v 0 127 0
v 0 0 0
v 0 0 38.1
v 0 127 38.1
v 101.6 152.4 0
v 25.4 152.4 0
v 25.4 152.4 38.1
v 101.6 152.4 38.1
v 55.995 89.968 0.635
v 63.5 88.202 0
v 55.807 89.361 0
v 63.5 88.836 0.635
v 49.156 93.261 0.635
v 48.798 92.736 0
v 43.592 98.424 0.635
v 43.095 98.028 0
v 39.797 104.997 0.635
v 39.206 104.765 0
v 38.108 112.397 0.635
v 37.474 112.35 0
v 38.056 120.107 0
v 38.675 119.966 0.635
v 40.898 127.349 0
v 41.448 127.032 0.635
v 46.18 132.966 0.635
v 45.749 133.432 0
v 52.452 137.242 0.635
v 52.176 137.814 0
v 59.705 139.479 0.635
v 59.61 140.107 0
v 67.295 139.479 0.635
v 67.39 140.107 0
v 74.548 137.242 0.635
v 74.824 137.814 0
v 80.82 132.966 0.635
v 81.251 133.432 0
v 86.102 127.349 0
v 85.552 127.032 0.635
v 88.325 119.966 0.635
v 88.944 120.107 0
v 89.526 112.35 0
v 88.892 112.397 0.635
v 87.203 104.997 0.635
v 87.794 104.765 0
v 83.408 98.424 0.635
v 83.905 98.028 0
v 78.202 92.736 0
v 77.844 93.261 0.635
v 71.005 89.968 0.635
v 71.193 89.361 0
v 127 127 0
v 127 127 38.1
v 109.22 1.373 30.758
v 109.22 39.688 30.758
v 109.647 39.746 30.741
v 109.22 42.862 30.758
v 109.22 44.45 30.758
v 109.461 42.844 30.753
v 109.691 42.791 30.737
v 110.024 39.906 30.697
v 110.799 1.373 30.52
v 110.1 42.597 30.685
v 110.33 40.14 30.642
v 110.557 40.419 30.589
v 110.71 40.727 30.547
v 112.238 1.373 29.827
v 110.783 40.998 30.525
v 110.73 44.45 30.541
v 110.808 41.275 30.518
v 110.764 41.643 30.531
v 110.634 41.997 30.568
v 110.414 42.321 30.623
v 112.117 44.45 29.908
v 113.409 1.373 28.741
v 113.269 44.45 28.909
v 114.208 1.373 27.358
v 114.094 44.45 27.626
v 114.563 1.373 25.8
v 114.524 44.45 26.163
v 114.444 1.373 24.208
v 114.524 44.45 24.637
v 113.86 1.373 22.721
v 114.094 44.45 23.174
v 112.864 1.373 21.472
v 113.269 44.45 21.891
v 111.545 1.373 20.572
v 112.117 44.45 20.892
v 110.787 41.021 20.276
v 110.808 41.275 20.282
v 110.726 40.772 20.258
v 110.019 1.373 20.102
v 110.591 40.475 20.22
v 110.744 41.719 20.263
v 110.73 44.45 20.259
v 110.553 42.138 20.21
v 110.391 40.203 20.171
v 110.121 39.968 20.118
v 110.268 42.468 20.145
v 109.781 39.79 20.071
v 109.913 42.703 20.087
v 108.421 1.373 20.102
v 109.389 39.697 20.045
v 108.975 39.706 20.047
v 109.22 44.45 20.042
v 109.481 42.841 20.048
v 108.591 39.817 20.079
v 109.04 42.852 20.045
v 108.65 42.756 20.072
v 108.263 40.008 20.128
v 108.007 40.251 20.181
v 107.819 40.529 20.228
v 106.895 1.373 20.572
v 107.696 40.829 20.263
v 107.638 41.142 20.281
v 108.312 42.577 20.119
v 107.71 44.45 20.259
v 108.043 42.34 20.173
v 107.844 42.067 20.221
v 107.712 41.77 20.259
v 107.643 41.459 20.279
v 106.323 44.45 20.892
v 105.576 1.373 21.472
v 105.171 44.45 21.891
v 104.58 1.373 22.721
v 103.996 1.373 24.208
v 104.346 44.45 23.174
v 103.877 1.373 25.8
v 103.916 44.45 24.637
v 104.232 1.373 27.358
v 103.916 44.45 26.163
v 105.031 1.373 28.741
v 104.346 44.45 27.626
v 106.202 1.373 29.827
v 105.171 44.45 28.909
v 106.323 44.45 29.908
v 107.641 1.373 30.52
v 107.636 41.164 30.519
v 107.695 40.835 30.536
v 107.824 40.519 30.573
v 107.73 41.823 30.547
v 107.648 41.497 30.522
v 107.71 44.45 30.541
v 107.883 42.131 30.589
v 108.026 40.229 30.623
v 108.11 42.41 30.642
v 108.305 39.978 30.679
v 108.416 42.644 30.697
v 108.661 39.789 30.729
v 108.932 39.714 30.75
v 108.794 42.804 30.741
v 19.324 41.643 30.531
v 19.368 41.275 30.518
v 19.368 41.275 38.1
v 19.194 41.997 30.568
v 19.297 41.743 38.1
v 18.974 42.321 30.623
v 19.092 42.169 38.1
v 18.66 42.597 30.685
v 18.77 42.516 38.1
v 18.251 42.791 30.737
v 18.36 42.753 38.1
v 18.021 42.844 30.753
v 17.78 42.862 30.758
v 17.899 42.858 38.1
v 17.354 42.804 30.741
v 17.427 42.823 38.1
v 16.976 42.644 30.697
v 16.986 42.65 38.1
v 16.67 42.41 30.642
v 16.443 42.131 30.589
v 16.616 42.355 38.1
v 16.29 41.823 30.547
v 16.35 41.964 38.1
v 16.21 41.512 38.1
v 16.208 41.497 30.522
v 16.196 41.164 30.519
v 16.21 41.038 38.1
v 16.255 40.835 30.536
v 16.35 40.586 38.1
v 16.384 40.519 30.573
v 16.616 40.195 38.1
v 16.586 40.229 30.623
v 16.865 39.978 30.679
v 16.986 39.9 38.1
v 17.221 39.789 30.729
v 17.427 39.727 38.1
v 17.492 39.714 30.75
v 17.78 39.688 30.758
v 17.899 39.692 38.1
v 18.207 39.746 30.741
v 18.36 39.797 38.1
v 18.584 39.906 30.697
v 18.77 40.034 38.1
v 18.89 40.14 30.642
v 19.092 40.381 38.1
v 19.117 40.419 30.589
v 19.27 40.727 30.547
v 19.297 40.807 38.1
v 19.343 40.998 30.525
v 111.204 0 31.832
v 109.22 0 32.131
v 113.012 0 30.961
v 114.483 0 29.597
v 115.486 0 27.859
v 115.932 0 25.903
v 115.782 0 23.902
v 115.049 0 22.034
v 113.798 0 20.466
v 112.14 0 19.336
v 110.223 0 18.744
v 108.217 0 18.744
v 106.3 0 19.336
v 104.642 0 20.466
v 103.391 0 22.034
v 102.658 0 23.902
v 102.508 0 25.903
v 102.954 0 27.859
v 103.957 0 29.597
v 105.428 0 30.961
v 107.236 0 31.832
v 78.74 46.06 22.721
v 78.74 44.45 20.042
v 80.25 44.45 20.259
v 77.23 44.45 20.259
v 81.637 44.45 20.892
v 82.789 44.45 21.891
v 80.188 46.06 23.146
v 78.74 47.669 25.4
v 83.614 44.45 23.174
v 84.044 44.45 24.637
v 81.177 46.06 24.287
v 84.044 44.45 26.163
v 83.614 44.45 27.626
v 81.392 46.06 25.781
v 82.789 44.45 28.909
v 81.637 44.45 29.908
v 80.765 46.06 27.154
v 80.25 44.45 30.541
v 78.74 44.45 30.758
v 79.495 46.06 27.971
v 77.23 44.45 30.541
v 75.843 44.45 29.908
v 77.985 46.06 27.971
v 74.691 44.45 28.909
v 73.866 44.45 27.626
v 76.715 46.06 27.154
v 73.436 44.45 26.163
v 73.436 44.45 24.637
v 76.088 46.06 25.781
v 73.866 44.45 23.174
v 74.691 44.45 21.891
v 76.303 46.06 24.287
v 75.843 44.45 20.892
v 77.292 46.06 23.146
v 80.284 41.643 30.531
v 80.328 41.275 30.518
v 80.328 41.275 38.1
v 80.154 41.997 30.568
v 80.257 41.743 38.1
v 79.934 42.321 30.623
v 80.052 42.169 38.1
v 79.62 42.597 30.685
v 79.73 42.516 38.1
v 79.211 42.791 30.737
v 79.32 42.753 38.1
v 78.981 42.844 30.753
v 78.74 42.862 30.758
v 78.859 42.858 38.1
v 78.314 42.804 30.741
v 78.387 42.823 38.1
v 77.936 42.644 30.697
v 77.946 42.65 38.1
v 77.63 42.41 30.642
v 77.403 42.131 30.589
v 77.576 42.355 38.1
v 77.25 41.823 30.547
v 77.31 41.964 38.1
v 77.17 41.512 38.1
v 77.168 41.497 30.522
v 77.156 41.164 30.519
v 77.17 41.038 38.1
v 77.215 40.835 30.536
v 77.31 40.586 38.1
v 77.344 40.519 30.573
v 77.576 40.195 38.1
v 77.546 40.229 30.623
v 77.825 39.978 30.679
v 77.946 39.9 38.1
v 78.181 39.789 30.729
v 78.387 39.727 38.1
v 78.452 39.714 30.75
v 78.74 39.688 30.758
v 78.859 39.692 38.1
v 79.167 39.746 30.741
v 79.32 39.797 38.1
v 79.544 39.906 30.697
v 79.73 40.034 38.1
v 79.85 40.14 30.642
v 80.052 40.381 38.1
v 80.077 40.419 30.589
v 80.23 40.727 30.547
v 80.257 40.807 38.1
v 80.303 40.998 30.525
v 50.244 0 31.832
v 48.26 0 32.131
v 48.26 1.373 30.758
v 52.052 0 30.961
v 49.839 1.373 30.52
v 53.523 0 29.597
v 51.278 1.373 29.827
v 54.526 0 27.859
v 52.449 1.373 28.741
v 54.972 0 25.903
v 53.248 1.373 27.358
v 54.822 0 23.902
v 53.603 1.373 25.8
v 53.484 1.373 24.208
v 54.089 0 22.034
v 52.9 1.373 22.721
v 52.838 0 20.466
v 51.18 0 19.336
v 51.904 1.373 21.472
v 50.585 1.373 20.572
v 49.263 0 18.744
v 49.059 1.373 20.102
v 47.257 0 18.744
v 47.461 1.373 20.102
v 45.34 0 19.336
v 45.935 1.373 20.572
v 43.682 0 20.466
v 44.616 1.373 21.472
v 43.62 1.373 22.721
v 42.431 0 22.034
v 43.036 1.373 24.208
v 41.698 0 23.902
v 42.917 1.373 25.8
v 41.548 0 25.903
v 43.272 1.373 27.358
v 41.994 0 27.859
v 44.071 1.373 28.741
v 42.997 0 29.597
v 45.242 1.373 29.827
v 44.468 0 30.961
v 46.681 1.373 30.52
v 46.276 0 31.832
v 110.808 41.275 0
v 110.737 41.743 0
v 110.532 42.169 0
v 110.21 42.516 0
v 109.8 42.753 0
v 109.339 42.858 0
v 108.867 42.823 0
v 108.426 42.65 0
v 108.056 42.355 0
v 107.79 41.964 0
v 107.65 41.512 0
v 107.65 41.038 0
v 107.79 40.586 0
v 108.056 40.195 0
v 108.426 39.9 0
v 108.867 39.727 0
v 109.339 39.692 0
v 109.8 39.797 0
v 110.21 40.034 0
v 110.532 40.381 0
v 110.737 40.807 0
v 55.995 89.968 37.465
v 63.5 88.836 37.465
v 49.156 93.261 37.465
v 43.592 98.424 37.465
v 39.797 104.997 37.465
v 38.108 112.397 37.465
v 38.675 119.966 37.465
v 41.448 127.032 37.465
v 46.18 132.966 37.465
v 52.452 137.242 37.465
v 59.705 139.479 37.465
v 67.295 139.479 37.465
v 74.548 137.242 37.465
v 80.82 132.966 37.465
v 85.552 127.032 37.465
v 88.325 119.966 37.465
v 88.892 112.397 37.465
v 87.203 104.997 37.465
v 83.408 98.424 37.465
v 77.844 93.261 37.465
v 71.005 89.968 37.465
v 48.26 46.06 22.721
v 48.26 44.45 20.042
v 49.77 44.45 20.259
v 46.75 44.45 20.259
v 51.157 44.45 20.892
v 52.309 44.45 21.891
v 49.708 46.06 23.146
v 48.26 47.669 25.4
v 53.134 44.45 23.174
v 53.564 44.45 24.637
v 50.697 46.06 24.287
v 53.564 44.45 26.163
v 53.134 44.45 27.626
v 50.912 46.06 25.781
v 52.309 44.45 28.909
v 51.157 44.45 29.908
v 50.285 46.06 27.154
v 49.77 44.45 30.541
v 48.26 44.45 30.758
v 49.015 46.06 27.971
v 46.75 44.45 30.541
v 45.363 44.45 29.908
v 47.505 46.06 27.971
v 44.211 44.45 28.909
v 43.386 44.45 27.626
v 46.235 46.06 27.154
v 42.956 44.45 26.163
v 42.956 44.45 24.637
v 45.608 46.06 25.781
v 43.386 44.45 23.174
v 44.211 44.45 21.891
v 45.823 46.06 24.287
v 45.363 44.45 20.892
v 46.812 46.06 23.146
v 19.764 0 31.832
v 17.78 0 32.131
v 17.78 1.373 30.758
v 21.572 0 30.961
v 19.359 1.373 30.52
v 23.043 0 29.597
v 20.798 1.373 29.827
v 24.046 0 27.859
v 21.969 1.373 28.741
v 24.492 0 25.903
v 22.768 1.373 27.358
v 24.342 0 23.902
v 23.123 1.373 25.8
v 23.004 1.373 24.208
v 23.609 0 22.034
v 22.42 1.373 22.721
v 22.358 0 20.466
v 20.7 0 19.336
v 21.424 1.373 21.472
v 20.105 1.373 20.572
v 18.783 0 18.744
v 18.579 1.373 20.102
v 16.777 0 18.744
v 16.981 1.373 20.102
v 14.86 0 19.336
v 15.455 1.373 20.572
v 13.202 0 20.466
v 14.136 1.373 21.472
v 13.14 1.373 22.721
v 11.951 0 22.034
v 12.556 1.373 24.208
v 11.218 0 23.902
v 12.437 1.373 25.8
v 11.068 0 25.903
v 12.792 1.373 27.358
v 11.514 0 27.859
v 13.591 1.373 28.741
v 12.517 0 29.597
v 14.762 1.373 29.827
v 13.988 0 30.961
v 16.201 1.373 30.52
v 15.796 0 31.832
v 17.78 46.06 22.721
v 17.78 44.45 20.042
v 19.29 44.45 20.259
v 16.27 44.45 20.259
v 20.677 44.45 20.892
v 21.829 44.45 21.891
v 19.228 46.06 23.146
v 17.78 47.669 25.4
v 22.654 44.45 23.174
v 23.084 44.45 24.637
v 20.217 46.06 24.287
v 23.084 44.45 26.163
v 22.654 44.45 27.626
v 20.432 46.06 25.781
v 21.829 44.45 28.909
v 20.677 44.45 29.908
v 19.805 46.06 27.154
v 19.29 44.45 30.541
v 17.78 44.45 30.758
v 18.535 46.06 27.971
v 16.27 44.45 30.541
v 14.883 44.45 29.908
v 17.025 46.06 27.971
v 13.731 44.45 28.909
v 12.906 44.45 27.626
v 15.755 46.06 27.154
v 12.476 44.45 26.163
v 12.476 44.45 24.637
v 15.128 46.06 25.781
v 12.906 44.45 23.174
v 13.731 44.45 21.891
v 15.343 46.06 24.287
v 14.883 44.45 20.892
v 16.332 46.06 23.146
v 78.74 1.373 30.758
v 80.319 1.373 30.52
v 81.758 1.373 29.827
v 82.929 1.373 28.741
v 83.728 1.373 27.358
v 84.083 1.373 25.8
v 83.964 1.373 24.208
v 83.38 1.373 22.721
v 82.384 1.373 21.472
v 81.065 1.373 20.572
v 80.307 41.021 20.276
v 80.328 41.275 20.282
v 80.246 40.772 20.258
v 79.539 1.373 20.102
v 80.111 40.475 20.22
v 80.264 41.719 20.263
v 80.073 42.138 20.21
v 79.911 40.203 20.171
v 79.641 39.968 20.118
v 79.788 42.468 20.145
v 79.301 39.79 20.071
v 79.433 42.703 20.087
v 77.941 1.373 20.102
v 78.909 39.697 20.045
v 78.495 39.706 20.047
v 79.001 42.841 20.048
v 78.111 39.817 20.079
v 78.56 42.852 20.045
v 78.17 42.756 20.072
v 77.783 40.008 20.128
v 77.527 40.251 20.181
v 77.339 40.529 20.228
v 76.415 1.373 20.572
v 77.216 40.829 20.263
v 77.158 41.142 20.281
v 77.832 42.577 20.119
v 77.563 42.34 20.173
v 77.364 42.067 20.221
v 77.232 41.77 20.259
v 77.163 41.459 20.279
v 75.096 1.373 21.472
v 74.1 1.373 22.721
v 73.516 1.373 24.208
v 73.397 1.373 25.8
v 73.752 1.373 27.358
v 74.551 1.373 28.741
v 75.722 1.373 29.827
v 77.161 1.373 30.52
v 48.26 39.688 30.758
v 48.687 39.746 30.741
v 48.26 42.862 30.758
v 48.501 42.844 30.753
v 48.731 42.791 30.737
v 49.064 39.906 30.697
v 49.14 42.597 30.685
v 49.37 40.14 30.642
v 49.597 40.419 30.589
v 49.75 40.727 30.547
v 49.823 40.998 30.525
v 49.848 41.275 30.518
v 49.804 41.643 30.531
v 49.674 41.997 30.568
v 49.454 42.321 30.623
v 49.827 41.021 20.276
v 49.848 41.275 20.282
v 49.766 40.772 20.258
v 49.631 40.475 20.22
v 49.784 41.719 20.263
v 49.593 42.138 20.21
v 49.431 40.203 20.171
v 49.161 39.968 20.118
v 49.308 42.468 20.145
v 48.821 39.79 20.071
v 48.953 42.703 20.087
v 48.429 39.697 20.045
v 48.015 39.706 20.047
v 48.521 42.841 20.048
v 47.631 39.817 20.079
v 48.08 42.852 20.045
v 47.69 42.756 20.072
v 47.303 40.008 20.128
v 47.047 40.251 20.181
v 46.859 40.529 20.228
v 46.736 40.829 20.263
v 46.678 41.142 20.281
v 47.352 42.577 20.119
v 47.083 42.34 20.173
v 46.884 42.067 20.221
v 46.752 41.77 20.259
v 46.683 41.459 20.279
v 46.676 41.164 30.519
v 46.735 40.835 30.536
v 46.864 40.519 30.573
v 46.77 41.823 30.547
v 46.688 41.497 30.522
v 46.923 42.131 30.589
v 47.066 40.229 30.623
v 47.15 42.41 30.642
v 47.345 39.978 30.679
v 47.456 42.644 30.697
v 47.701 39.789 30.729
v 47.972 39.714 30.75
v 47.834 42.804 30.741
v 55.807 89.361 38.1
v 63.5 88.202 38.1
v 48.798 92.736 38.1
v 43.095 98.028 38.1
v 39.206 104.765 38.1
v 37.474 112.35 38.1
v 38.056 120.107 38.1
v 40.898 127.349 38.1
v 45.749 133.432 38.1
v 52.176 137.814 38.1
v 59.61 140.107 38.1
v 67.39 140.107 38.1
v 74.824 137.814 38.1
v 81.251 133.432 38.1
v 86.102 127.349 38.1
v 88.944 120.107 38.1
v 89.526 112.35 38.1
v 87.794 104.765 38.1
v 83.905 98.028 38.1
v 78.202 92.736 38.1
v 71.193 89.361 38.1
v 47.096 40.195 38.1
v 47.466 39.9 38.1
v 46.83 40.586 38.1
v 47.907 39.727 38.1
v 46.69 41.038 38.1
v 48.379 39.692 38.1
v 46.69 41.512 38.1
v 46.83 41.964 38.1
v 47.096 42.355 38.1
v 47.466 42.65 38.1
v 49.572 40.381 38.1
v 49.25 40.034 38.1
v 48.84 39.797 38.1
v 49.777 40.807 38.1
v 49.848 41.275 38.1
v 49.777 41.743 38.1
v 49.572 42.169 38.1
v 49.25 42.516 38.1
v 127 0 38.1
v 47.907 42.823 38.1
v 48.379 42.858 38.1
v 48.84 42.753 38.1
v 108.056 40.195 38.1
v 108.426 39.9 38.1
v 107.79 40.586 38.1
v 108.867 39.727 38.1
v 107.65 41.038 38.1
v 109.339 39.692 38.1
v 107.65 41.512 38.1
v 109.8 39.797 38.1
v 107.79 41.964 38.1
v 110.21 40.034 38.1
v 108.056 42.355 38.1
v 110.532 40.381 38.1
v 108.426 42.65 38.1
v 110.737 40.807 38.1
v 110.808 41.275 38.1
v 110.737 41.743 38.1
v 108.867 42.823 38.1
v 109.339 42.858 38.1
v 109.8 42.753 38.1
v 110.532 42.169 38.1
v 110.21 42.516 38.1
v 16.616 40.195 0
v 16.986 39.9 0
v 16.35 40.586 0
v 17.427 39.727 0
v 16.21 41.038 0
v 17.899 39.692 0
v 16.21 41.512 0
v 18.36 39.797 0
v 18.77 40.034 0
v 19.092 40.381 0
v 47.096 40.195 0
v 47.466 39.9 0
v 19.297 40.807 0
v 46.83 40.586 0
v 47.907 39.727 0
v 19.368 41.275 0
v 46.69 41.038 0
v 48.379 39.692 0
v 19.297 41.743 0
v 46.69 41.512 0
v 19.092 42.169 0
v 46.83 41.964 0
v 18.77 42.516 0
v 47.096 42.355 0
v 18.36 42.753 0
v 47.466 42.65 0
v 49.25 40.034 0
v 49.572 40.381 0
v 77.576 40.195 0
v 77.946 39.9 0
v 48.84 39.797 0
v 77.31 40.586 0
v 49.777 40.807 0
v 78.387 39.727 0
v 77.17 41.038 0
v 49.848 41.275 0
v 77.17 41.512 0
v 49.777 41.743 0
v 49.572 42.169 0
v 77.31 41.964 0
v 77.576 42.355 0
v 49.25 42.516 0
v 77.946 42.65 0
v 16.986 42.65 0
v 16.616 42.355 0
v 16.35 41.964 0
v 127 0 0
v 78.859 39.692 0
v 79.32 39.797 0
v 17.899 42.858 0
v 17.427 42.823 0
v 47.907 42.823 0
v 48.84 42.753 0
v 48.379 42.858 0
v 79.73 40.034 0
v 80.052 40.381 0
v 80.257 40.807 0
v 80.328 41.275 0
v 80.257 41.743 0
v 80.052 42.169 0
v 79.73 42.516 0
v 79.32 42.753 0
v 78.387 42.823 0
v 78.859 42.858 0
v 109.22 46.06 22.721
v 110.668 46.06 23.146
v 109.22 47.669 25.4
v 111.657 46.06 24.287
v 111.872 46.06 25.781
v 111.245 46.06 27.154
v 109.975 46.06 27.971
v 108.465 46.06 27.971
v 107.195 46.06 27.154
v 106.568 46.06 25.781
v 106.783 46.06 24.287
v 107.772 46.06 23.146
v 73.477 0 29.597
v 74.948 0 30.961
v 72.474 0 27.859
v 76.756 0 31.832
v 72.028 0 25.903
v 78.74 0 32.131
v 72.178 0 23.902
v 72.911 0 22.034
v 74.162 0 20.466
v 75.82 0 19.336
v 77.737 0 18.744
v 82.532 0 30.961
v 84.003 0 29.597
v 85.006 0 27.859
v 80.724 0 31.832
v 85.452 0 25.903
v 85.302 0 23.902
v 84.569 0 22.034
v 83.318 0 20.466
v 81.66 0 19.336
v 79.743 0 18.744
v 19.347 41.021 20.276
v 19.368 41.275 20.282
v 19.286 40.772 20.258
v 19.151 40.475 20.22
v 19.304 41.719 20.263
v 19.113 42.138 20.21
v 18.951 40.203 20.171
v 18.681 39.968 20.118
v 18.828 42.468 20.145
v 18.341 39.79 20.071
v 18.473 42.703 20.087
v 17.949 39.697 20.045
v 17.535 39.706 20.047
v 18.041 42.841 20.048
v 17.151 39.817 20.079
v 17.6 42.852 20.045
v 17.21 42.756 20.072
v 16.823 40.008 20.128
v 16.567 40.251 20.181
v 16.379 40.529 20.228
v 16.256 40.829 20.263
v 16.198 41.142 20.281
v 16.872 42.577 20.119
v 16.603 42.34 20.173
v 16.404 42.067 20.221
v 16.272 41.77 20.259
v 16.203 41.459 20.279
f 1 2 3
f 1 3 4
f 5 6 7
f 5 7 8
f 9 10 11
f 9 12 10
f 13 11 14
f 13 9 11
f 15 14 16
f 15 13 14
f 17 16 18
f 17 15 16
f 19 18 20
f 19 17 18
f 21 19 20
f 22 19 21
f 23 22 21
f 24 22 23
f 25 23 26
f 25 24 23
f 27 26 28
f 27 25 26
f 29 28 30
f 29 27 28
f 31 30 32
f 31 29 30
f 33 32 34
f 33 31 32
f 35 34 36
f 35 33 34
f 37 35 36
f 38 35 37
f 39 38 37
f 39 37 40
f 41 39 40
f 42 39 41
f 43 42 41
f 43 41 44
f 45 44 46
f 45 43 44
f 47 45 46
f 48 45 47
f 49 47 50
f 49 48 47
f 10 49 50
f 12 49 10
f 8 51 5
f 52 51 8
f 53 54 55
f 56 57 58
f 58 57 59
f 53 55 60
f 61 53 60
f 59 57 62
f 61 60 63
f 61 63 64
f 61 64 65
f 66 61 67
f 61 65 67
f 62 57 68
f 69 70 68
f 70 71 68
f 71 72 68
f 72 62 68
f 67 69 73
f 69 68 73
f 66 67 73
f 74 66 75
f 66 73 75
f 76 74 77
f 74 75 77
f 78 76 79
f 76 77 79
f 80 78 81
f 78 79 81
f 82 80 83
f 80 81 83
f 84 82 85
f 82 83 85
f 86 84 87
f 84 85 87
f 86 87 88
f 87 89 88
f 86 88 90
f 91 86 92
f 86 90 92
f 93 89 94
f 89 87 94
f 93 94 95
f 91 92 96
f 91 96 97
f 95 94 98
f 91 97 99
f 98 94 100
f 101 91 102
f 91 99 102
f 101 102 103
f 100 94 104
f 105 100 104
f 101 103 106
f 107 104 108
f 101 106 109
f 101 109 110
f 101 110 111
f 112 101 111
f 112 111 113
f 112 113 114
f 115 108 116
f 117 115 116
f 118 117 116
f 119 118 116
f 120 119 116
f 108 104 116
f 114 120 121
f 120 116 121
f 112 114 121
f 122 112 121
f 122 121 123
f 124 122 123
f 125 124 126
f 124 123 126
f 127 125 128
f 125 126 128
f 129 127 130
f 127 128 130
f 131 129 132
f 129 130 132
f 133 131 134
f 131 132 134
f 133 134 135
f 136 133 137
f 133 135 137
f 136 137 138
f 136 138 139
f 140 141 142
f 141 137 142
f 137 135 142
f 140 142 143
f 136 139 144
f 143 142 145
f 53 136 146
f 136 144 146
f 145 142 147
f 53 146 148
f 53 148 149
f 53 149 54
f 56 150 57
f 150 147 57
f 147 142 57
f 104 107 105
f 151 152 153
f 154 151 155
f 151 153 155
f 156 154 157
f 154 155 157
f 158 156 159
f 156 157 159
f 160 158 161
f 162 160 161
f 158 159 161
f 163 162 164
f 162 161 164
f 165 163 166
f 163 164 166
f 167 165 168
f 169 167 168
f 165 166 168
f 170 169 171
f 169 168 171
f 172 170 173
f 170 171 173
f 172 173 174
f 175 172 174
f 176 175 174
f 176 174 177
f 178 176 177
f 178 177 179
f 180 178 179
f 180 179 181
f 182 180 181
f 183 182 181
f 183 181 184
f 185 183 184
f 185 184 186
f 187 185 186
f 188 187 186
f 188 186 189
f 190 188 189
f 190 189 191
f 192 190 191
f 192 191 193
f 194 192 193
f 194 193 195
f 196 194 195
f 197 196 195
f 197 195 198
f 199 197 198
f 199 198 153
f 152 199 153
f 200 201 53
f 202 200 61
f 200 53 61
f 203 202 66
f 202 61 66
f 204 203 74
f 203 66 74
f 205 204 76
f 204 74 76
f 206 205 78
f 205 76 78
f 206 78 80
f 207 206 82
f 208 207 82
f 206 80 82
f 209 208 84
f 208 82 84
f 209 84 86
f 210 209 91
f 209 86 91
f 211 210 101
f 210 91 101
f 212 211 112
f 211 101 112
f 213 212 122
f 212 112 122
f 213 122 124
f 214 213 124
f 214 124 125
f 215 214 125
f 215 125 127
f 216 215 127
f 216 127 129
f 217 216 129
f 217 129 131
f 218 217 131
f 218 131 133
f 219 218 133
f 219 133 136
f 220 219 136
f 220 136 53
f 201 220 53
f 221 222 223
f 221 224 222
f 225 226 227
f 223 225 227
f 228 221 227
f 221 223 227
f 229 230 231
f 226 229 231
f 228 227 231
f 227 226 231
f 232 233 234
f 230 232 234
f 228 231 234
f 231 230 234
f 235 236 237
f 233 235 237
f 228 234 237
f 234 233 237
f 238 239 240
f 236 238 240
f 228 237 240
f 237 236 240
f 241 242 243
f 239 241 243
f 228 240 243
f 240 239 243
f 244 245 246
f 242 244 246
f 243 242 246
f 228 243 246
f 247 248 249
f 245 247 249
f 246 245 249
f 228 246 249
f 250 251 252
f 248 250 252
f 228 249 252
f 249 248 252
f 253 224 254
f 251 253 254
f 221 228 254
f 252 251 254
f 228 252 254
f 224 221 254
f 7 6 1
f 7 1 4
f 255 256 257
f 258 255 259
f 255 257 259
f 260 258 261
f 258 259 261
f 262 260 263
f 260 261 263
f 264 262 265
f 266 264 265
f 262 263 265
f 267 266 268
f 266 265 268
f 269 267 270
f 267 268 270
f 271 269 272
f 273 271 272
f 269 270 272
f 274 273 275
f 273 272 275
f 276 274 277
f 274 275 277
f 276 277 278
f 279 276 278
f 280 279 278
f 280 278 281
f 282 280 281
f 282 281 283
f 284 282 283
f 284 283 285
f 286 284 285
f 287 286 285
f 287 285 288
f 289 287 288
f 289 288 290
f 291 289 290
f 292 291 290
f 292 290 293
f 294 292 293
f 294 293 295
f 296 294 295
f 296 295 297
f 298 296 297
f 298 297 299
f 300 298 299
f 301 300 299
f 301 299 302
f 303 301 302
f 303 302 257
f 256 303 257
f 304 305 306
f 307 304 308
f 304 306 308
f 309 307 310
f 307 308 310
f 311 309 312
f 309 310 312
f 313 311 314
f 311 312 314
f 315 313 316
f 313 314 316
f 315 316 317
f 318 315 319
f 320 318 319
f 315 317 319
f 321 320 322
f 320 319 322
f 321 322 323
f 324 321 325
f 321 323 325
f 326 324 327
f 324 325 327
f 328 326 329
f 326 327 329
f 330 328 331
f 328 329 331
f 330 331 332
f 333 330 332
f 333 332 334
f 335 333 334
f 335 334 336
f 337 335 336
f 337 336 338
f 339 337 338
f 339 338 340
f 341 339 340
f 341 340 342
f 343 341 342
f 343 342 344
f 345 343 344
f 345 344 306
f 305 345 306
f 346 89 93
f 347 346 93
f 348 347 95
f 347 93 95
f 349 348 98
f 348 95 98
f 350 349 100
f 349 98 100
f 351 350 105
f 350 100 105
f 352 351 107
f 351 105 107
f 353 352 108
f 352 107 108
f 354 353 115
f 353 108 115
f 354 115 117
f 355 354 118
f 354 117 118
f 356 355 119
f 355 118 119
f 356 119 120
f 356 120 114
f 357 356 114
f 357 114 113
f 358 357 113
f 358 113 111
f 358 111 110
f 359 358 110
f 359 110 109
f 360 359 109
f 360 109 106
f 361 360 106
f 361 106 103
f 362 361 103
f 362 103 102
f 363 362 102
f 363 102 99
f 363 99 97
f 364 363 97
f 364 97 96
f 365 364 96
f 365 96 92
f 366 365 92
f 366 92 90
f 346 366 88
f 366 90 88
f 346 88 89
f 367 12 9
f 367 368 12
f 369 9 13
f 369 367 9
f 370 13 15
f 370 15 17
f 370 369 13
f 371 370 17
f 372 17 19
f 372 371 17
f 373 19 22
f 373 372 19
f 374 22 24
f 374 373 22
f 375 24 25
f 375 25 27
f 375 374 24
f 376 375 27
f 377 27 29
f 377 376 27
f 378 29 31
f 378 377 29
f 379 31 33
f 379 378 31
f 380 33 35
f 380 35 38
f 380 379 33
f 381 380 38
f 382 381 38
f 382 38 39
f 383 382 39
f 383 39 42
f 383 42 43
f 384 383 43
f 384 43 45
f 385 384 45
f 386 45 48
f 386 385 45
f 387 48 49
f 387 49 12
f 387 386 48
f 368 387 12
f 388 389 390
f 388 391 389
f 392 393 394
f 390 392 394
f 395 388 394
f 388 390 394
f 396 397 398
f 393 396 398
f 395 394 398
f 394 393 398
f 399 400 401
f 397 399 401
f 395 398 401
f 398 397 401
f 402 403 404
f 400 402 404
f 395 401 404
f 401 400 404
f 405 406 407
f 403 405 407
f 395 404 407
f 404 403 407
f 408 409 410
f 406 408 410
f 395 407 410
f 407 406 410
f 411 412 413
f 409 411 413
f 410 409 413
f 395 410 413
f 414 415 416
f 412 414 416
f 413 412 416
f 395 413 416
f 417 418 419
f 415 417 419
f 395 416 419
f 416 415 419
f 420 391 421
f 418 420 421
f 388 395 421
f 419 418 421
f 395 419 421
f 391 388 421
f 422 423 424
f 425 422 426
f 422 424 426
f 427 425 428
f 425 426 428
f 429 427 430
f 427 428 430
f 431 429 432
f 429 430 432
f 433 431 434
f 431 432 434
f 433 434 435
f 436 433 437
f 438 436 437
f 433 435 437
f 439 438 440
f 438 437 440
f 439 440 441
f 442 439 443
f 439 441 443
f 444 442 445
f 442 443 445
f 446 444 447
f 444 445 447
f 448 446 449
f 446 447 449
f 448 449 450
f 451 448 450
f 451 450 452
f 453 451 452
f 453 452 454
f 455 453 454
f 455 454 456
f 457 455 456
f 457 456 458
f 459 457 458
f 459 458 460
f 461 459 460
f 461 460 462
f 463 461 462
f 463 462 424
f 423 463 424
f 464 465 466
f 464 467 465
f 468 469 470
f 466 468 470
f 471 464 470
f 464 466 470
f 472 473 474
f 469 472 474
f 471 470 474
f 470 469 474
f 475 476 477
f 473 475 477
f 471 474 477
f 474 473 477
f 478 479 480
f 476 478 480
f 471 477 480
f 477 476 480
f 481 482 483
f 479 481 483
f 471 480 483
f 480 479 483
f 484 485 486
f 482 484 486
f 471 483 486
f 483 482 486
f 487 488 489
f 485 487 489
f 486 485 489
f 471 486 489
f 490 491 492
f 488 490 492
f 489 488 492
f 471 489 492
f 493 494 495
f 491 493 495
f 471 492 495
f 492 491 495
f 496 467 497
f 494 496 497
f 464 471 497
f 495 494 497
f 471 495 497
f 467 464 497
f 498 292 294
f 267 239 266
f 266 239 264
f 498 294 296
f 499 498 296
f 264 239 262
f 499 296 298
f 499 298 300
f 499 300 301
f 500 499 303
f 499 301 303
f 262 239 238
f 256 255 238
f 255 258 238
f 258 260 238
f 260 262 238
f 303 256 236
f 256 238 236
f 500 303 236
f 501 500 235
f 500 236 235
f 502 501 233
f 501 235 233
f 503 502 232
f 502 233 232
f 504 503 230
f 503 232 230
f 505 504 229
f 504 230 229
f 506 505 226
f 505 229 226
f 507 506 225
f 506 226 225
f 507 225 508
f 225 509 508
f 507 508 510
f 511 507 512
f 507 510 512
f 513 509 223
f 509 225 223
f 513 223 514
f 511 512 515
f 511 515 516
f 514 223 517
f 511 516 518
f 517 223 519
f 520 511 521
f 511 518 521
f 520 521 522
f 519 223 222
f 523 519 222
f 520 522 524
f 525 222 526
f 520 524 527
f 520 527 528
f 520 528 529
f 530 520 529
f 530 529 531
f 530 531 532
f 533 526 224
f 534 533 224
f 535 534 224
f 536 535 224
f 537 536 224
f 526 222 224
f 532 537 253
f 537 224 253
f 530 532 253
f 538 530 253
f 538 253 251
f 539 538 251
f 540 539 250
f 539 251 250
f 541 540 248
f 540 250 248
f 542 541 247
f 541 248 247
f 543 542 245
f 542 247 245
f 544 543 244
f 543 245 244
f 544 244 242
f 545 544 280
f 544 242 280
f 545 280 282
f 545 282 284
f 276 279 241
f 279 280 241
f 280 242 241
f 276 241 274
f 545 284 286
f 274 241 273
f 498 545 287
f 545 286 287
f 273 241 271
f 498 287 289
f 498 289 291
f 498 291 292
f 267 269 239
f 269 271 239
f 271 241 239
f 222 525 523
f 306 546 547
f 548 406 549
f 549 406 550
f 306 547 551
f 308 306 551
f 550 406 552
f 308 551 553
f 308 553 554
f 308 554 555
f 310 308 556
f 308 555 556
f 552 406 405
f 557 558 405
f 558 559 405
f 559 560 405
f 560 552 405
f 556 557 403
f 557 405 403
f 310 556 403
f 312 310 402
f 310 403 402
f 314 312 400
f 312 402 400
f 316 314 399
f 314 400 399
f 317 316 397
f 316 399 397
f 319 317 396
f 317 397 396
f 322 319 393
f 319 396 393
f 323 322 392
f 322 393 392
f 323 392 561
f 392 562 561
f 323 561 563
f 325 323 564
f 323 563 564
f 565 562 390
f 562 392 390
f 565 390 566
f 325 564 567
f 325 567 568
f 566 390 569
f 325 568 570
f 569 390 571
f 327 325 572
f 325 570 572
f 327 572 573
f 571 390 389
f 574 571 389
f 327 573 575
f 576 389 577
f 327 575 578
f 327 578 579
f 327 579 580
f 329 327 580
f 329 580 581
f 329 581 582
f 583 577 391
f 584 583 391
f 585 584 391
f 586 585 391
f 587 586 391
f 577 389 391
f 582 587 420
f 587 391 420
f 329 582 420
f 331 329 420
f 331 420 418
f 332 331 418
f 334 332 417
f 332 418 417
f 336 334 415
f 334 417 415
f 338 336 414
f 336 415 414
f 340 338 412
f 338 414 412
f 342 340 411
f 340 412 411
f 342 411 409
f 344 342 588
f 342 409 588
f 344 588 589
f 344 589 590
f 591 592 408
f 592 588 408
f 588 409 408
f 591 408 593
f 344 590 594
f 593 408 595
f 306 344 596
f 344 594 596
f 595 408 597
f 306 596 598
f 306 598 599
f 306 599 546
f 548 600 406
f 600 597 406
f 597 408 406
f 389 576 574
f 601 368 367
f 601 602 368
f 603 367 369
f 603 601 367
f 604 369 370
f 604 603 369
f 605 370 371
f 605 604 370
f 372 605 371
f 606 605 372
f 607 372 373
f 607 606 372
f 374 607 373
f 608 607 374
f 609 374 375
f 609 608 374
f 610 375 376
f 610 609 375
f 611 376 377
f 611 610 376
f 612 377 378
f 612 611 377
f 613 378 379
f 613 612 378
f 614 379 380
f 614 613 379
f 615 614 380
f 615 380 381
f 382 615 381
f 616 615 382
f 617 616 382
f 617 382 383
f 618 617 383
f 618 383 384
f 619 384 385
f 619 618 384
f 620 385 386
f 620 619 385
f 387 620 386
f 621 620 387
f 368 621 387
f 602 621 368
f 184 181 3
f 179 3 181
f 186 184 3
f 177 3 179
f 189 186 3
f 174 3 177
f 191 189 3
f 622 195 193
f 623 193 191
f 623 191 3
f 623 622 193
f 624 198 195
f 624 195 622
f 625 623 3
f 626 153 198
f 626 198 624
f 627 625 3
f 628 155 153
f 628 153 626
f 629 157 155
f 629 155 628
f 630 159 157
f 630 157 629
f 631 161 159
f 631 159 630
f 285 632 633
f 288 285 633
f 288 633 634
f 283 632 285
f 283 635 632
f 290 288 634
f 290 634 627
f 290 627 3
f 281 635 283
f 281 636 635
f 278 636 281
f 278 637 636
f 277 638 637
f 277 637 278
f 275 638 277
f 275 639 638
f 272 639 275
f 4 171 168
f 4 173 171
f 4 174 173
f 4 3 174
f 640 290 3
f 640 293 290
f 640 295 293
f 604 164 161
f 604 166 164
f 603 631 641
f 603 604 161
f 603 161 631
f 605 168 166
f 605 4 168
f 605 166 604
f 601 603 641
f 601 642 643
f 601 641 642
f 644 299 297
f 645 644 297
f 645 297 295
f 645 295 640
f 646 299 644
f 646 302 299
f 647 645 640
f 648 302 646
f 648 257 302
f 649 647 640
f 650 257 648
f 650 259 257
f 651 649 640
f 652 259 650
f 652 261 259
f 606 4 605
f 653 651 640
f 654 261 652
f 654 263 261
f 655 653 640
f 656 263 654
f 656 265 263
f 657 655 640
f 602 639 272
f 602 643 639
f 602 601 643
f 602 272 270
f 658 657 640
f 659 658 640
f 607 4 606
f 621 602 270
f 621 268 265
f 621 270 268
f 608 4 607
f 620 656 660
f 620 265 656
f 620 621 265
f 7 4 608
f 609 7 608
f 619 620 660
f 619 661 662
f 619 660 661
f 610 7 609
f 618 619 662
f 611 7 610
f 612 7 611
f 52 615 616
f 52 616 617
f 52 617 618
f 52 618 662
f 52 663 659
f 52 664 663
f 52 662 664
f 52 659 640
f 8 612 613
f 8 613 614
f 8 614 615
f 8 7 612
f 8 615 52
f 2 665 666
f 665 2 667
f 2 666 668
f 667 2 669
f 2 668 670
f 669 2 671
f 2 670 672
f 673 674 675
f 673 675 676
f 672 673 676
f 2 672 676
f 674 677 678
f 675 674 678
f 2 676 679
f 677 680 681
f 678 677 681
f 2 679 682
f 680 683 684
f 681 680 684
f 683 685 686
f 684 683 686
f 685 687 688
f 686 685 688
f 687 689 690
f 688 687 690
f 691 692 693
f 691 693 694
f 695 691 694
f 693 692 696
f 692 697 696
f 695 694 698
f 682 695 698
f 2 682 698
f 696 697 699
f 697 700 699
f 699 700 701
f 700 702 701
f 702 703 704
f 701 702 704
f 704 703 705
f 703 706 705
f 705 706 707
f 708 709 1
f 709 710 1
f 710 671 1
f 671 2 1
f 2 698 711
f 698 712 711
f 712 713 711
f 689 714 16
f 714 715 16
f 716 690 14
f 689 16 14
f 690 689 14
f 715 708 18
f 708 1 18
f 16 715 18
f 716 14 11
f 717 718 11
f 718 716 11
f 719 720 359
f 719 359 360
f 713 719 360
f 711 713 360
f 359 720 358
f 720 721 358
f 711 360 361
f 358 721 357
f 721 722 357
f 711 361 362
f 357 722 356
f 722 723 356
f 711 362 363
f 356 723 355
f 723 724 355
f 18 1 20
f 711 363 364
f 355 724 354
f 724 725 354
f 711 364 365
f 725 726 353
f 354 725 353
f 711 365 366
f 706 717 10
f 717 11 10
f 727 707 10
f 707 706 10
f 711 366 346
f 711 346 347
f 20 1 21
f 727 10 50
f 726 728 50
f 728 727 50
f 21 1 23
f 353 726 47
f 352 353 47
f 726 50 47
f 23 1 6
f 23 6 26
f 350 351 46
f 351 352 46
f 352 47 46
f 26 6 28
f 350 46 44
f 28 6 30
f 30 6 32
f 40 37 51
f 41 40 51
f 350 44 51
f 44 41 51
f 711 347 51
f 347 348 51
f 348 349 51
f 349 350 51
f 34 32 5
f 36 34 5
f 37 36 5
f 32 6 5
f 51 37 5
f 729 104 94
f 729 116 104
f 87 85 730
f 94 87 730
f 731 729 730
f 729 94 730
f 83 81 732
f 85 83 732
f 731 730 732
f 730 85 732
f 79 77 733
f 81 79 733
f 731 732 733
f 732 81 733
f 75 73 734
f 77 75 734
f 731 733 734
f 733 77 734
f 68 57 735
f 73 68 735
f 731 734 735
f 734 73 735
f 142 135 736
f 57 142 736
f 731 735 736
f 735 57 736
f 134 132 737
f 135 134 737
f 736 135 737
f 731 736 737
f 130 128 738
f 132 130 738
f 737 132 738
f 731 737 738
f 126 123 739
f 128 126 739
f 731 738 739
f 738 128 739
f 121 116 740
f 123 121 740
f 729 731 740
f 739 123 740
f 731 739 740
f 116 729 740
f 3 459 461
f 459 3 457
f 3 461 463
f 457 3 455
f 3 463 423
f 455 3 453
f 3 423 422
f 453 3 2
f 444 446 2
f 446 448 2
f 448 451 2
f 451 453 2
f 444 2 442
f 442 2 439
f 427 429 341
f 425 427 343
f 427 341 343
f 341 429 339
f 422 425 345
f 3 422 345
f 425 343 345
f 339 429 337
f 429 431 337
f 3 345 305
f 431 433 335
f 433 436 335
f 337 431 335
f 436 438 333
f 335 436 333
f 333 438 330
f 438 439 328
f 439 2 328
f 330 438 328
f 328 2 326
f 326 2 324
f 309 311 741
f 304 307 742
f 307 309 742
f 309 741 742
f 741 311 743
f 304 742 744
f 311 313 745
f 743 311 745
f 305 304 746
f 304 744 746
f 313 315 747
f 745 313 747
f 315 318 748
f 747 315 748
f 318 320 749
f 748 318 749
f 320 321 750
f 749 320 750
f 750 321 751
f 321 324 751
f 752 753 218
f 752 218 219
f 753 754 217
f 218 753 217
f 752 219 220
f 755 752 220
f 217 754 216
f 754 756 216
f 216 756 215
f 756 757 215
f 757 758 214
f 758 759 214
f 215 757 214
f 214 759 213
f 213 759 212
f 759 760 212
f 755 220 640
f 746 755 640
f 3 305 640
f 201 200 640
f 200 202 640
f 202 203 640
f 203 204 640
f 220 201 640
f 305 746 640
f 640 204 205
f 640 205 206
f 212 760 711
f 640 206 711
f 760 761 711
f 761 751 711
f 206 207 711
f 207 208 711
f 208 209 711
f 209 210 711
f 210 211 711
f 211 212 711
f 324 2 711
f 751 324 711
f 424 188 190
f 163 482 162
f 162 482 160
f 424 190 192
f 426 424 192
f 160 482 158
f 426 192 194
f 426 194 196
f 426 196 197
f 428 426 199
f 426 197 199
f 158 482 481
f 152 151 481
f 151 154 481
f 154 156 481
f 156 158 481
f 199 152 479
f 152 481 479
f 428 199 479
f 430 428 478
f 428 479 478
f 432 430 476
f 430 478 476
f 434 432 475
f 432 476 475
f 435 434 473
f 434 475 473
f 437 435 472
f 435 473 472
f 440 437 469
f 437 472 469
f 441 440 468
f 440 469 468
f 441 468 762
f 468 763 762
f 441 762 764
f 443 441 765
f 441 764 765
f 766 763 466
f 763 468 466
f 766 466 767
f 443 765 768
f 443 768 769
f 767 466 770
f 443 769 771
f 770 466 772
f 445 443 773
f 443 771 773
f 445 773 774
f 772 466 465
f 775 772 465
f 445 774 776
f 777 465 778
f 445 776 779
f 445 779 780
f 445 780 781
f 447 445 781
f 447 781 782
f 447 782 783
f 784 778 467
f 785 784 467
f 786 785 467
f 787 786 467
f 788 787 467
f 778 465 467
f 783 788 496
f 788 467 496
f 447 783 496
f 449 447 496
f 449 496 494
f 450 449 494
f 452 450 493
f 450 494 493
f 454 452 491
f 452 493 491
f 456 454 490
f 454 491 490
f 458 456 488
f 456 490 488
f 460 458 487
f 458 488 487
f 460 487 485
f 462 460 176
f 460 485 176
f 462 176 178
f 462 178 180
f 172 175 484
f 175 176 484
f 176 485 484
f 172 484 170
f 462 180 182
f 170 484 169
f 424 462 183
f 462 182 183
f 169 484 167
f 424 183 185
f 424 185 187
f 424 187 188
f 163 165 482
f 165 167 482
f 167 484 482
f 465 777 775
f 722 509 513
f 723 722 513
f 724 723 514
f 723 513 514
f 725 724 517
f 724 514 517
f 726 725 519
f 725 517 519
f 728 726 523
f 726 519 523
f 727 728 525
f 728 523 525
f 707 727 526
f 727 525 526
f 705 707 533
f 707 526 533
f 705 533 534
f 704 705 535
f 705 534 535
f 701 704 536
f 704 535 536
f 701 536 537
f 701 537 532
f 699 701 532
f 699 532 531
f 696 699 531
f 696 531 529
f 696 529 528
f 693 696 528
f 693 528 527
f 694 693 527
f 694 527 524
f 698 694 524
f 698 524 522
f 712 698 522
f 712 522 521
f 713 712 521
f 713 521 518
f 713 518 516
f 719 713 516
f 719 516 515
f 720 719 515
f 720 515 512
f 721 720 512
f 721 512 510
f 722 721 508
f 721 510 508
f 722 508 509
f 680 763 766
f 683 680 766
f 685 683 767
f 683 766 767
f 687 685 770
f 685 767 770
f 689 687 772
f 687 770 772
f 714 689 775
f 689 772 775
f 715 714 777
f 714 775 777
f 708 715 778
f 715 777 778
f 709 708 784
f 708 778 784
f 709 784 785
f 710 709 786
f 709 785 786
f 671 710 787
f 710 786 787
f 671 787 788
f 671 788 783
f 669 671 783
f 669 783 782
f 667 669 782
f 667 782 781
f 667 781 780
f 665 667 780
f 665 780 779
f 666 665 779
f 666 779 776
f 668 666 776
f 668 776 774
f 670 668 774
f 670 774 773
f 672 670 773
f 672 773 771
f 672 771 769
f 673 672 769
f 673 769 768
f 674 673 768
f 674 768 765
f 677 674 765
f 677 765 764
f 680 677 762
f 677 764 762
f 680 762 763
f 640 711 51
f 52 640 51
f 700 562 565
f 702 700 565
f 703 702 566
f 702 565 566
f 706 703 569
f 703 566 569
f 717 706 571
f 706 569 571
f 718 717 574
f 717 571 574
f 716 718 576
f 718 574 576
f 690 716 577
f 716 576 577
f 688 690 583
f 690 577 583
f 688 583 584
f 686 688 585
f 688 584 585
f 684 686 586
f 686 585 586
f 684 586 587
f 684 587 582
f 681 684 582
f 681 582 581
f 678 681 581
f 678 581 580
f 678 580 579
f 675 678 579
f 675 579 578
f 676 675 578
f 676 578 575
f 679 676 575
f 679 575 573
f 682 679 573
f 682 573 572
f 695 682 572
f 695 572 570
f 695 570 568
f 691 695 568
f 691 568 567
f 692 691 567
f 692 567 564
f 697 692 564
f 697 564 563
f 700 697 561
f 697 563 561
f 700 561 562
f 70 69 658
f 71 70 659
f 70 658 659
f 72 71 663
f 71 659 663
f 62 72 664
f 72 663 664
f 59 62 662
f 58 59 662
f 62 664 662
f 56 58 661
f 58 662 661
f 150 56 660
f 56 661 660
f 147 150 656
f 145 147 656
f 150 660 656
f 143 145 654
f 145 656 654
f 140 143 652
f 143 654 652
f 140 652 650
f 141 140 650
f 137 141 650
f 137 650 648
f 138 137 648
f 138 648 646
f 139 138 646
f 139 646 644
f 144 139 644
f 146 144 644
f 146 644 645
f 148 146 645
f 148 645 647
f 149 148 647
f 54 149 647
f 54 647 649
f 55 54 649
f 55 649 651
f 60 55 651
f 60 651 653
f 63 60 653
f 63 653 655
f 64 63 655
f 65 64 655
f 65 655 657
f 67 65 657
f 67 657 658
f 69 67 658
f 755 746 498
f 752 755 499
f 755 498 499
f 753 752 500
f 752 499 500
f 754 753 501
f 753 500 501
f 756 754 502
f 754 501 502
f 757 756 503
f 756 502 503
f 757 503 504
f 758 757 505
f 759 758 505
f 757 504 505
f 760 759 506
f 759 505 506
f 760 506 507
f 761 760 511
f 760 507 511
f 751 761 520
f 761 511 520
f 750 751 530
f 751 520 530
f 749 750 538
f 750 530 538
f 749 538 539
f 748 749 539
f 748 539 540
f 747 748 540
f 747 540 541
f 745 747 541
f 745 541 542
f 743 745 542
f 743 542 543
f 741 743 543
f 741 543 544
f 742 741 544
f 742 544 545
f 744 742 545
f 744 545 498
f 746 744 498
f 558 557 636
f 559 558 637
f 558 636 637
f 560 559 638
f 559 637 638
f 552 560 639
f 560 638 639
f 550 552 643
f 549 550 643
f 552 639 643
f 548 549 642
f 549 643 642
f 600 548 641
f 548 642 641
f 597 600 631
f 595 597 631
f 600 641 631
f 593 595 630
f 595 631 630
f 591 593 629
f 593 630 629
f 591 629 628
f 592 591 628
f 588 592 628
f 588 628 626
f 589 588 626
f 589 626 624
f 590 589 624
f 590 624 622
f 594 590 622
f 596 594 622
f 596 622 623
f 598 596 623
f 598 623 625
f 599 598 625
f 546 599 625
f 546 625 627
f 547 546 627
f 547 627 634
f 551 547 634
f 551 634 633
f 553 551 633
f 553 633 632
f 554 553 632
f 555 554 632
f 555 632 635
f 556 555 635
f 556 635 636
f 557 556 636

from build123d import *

# Parameters (mm, degrees)
SKETCH1_W                         = 127
SKETCH1_H                         = 152.4
EXTRUDE1_DEPTH                    = 38.1
CHAMFER1_SIZE                     = 25.4
F_1_2_13_TAPPED_HOLE1_D           = 10.71626
F_1_2_13_TAPPED_HOLE1_DEPTH       = 44.45
F_1_2_13_TAPPED_HOLE1_CSINK_D     = 13.462
F_1_2_13_TAPPED_HOLE1_CSINK_ANGLE = 90
F_1_2_13_TAPPED_HOLE1_TIP         = 3.219489309
SKETCH4_R                         = 1.5875
CUT_EXTRUDE1_DEPTH                = 39.1


with BuildPart() as part:
    # Sketch1 → Extrude1 (new body)
    with BuildSketch(Plane.XY):
        with Locations((63.5, 76.2)):
            Rectangle(SKETCH1_W, SKETCH1_H)
    extrude(amount=EXTRUDE1_DEPTH)

    # Sketch5 → 1 (1) Diameter Hole1 (revolve, cut)
    with BuildSketch(Plane(origin=(63.5, 114.3, 38.1), x_dir=(0, -1, 0), z_dir=(1, 0, 0))):
        Polygon((0, 0), (0, 38.1), (26.0985, 38.1), (25.4635, 37.465), (25.4635, 0.635), (26.0985, 0), align=None)
    revolve(axis=Axis((63.5, 114.3, 44.45), (0, 0, -1)), mode=Mode.SUBTRACT)

    # Chamfer1
    chamfer1_edges = [part.edges().sort_by_distance(p)[0] for p in [
        (0, 152.4, 19.05),
        (127, 152.4, 19.05),
    ]]
    chamfer(chamfer1_edges, length=CHAMFER1_SIZE)

    # 1/2-13 Tapped Hole1
    with Locations(Plane(origin=(109.22, 0, 25.4), x_dir=(0, 0, -1), z_dir=(0, -1, 0))):
        with Locations((0, 0), (0, -30.48), (0, -60.96), (0, -91.44)):
            CounterSinkHole(F_1_2_13_TAPPED_HOLE1_D / 2, F_1_2_13_TAPPED_HOLE1_CSINK_D / 2, depth=F_1_2_13_TAPPED_HOLE1_DEPTH, counter_sink_angle=F_1_2_13_TAPPED_HOLE1_CSINK_ANGLE)
            with Locations((0, 0, -(F_1_2_13_TAPPED_HOLE1_DEPTH + F_1_2_13_TAPPED_HOLE1_TIP / 2))):  # 118° drill point
                Cone(0, F_1_2_13_TAPPED_HOLE1_D / 2, F_1_2_13_TAPPED_HOLE1_TIP, mode=Mode.SUBTRACT)

    # Sketch4 → Cut-Extrude1 (cut, through all)
    with BuildSketch(Plane.XY.offset(38.1)):
        with Locations((17.78, 41.275)):
            Circle(SKETCH4_R)
        with Locations((48.26, 41.275)):
            Circle(SKETCH4_R)
        with Locations((78.74, 41.275)):
            Circle(SKETCH4_R)
        with Locations((109.22, 41.275)):
            Circle(SKETCH4_R)
    extrude(amount=-CUT_EXTRUDE1_DEPTH, mode=Mode.SUBTRACT)


solid = part.part
